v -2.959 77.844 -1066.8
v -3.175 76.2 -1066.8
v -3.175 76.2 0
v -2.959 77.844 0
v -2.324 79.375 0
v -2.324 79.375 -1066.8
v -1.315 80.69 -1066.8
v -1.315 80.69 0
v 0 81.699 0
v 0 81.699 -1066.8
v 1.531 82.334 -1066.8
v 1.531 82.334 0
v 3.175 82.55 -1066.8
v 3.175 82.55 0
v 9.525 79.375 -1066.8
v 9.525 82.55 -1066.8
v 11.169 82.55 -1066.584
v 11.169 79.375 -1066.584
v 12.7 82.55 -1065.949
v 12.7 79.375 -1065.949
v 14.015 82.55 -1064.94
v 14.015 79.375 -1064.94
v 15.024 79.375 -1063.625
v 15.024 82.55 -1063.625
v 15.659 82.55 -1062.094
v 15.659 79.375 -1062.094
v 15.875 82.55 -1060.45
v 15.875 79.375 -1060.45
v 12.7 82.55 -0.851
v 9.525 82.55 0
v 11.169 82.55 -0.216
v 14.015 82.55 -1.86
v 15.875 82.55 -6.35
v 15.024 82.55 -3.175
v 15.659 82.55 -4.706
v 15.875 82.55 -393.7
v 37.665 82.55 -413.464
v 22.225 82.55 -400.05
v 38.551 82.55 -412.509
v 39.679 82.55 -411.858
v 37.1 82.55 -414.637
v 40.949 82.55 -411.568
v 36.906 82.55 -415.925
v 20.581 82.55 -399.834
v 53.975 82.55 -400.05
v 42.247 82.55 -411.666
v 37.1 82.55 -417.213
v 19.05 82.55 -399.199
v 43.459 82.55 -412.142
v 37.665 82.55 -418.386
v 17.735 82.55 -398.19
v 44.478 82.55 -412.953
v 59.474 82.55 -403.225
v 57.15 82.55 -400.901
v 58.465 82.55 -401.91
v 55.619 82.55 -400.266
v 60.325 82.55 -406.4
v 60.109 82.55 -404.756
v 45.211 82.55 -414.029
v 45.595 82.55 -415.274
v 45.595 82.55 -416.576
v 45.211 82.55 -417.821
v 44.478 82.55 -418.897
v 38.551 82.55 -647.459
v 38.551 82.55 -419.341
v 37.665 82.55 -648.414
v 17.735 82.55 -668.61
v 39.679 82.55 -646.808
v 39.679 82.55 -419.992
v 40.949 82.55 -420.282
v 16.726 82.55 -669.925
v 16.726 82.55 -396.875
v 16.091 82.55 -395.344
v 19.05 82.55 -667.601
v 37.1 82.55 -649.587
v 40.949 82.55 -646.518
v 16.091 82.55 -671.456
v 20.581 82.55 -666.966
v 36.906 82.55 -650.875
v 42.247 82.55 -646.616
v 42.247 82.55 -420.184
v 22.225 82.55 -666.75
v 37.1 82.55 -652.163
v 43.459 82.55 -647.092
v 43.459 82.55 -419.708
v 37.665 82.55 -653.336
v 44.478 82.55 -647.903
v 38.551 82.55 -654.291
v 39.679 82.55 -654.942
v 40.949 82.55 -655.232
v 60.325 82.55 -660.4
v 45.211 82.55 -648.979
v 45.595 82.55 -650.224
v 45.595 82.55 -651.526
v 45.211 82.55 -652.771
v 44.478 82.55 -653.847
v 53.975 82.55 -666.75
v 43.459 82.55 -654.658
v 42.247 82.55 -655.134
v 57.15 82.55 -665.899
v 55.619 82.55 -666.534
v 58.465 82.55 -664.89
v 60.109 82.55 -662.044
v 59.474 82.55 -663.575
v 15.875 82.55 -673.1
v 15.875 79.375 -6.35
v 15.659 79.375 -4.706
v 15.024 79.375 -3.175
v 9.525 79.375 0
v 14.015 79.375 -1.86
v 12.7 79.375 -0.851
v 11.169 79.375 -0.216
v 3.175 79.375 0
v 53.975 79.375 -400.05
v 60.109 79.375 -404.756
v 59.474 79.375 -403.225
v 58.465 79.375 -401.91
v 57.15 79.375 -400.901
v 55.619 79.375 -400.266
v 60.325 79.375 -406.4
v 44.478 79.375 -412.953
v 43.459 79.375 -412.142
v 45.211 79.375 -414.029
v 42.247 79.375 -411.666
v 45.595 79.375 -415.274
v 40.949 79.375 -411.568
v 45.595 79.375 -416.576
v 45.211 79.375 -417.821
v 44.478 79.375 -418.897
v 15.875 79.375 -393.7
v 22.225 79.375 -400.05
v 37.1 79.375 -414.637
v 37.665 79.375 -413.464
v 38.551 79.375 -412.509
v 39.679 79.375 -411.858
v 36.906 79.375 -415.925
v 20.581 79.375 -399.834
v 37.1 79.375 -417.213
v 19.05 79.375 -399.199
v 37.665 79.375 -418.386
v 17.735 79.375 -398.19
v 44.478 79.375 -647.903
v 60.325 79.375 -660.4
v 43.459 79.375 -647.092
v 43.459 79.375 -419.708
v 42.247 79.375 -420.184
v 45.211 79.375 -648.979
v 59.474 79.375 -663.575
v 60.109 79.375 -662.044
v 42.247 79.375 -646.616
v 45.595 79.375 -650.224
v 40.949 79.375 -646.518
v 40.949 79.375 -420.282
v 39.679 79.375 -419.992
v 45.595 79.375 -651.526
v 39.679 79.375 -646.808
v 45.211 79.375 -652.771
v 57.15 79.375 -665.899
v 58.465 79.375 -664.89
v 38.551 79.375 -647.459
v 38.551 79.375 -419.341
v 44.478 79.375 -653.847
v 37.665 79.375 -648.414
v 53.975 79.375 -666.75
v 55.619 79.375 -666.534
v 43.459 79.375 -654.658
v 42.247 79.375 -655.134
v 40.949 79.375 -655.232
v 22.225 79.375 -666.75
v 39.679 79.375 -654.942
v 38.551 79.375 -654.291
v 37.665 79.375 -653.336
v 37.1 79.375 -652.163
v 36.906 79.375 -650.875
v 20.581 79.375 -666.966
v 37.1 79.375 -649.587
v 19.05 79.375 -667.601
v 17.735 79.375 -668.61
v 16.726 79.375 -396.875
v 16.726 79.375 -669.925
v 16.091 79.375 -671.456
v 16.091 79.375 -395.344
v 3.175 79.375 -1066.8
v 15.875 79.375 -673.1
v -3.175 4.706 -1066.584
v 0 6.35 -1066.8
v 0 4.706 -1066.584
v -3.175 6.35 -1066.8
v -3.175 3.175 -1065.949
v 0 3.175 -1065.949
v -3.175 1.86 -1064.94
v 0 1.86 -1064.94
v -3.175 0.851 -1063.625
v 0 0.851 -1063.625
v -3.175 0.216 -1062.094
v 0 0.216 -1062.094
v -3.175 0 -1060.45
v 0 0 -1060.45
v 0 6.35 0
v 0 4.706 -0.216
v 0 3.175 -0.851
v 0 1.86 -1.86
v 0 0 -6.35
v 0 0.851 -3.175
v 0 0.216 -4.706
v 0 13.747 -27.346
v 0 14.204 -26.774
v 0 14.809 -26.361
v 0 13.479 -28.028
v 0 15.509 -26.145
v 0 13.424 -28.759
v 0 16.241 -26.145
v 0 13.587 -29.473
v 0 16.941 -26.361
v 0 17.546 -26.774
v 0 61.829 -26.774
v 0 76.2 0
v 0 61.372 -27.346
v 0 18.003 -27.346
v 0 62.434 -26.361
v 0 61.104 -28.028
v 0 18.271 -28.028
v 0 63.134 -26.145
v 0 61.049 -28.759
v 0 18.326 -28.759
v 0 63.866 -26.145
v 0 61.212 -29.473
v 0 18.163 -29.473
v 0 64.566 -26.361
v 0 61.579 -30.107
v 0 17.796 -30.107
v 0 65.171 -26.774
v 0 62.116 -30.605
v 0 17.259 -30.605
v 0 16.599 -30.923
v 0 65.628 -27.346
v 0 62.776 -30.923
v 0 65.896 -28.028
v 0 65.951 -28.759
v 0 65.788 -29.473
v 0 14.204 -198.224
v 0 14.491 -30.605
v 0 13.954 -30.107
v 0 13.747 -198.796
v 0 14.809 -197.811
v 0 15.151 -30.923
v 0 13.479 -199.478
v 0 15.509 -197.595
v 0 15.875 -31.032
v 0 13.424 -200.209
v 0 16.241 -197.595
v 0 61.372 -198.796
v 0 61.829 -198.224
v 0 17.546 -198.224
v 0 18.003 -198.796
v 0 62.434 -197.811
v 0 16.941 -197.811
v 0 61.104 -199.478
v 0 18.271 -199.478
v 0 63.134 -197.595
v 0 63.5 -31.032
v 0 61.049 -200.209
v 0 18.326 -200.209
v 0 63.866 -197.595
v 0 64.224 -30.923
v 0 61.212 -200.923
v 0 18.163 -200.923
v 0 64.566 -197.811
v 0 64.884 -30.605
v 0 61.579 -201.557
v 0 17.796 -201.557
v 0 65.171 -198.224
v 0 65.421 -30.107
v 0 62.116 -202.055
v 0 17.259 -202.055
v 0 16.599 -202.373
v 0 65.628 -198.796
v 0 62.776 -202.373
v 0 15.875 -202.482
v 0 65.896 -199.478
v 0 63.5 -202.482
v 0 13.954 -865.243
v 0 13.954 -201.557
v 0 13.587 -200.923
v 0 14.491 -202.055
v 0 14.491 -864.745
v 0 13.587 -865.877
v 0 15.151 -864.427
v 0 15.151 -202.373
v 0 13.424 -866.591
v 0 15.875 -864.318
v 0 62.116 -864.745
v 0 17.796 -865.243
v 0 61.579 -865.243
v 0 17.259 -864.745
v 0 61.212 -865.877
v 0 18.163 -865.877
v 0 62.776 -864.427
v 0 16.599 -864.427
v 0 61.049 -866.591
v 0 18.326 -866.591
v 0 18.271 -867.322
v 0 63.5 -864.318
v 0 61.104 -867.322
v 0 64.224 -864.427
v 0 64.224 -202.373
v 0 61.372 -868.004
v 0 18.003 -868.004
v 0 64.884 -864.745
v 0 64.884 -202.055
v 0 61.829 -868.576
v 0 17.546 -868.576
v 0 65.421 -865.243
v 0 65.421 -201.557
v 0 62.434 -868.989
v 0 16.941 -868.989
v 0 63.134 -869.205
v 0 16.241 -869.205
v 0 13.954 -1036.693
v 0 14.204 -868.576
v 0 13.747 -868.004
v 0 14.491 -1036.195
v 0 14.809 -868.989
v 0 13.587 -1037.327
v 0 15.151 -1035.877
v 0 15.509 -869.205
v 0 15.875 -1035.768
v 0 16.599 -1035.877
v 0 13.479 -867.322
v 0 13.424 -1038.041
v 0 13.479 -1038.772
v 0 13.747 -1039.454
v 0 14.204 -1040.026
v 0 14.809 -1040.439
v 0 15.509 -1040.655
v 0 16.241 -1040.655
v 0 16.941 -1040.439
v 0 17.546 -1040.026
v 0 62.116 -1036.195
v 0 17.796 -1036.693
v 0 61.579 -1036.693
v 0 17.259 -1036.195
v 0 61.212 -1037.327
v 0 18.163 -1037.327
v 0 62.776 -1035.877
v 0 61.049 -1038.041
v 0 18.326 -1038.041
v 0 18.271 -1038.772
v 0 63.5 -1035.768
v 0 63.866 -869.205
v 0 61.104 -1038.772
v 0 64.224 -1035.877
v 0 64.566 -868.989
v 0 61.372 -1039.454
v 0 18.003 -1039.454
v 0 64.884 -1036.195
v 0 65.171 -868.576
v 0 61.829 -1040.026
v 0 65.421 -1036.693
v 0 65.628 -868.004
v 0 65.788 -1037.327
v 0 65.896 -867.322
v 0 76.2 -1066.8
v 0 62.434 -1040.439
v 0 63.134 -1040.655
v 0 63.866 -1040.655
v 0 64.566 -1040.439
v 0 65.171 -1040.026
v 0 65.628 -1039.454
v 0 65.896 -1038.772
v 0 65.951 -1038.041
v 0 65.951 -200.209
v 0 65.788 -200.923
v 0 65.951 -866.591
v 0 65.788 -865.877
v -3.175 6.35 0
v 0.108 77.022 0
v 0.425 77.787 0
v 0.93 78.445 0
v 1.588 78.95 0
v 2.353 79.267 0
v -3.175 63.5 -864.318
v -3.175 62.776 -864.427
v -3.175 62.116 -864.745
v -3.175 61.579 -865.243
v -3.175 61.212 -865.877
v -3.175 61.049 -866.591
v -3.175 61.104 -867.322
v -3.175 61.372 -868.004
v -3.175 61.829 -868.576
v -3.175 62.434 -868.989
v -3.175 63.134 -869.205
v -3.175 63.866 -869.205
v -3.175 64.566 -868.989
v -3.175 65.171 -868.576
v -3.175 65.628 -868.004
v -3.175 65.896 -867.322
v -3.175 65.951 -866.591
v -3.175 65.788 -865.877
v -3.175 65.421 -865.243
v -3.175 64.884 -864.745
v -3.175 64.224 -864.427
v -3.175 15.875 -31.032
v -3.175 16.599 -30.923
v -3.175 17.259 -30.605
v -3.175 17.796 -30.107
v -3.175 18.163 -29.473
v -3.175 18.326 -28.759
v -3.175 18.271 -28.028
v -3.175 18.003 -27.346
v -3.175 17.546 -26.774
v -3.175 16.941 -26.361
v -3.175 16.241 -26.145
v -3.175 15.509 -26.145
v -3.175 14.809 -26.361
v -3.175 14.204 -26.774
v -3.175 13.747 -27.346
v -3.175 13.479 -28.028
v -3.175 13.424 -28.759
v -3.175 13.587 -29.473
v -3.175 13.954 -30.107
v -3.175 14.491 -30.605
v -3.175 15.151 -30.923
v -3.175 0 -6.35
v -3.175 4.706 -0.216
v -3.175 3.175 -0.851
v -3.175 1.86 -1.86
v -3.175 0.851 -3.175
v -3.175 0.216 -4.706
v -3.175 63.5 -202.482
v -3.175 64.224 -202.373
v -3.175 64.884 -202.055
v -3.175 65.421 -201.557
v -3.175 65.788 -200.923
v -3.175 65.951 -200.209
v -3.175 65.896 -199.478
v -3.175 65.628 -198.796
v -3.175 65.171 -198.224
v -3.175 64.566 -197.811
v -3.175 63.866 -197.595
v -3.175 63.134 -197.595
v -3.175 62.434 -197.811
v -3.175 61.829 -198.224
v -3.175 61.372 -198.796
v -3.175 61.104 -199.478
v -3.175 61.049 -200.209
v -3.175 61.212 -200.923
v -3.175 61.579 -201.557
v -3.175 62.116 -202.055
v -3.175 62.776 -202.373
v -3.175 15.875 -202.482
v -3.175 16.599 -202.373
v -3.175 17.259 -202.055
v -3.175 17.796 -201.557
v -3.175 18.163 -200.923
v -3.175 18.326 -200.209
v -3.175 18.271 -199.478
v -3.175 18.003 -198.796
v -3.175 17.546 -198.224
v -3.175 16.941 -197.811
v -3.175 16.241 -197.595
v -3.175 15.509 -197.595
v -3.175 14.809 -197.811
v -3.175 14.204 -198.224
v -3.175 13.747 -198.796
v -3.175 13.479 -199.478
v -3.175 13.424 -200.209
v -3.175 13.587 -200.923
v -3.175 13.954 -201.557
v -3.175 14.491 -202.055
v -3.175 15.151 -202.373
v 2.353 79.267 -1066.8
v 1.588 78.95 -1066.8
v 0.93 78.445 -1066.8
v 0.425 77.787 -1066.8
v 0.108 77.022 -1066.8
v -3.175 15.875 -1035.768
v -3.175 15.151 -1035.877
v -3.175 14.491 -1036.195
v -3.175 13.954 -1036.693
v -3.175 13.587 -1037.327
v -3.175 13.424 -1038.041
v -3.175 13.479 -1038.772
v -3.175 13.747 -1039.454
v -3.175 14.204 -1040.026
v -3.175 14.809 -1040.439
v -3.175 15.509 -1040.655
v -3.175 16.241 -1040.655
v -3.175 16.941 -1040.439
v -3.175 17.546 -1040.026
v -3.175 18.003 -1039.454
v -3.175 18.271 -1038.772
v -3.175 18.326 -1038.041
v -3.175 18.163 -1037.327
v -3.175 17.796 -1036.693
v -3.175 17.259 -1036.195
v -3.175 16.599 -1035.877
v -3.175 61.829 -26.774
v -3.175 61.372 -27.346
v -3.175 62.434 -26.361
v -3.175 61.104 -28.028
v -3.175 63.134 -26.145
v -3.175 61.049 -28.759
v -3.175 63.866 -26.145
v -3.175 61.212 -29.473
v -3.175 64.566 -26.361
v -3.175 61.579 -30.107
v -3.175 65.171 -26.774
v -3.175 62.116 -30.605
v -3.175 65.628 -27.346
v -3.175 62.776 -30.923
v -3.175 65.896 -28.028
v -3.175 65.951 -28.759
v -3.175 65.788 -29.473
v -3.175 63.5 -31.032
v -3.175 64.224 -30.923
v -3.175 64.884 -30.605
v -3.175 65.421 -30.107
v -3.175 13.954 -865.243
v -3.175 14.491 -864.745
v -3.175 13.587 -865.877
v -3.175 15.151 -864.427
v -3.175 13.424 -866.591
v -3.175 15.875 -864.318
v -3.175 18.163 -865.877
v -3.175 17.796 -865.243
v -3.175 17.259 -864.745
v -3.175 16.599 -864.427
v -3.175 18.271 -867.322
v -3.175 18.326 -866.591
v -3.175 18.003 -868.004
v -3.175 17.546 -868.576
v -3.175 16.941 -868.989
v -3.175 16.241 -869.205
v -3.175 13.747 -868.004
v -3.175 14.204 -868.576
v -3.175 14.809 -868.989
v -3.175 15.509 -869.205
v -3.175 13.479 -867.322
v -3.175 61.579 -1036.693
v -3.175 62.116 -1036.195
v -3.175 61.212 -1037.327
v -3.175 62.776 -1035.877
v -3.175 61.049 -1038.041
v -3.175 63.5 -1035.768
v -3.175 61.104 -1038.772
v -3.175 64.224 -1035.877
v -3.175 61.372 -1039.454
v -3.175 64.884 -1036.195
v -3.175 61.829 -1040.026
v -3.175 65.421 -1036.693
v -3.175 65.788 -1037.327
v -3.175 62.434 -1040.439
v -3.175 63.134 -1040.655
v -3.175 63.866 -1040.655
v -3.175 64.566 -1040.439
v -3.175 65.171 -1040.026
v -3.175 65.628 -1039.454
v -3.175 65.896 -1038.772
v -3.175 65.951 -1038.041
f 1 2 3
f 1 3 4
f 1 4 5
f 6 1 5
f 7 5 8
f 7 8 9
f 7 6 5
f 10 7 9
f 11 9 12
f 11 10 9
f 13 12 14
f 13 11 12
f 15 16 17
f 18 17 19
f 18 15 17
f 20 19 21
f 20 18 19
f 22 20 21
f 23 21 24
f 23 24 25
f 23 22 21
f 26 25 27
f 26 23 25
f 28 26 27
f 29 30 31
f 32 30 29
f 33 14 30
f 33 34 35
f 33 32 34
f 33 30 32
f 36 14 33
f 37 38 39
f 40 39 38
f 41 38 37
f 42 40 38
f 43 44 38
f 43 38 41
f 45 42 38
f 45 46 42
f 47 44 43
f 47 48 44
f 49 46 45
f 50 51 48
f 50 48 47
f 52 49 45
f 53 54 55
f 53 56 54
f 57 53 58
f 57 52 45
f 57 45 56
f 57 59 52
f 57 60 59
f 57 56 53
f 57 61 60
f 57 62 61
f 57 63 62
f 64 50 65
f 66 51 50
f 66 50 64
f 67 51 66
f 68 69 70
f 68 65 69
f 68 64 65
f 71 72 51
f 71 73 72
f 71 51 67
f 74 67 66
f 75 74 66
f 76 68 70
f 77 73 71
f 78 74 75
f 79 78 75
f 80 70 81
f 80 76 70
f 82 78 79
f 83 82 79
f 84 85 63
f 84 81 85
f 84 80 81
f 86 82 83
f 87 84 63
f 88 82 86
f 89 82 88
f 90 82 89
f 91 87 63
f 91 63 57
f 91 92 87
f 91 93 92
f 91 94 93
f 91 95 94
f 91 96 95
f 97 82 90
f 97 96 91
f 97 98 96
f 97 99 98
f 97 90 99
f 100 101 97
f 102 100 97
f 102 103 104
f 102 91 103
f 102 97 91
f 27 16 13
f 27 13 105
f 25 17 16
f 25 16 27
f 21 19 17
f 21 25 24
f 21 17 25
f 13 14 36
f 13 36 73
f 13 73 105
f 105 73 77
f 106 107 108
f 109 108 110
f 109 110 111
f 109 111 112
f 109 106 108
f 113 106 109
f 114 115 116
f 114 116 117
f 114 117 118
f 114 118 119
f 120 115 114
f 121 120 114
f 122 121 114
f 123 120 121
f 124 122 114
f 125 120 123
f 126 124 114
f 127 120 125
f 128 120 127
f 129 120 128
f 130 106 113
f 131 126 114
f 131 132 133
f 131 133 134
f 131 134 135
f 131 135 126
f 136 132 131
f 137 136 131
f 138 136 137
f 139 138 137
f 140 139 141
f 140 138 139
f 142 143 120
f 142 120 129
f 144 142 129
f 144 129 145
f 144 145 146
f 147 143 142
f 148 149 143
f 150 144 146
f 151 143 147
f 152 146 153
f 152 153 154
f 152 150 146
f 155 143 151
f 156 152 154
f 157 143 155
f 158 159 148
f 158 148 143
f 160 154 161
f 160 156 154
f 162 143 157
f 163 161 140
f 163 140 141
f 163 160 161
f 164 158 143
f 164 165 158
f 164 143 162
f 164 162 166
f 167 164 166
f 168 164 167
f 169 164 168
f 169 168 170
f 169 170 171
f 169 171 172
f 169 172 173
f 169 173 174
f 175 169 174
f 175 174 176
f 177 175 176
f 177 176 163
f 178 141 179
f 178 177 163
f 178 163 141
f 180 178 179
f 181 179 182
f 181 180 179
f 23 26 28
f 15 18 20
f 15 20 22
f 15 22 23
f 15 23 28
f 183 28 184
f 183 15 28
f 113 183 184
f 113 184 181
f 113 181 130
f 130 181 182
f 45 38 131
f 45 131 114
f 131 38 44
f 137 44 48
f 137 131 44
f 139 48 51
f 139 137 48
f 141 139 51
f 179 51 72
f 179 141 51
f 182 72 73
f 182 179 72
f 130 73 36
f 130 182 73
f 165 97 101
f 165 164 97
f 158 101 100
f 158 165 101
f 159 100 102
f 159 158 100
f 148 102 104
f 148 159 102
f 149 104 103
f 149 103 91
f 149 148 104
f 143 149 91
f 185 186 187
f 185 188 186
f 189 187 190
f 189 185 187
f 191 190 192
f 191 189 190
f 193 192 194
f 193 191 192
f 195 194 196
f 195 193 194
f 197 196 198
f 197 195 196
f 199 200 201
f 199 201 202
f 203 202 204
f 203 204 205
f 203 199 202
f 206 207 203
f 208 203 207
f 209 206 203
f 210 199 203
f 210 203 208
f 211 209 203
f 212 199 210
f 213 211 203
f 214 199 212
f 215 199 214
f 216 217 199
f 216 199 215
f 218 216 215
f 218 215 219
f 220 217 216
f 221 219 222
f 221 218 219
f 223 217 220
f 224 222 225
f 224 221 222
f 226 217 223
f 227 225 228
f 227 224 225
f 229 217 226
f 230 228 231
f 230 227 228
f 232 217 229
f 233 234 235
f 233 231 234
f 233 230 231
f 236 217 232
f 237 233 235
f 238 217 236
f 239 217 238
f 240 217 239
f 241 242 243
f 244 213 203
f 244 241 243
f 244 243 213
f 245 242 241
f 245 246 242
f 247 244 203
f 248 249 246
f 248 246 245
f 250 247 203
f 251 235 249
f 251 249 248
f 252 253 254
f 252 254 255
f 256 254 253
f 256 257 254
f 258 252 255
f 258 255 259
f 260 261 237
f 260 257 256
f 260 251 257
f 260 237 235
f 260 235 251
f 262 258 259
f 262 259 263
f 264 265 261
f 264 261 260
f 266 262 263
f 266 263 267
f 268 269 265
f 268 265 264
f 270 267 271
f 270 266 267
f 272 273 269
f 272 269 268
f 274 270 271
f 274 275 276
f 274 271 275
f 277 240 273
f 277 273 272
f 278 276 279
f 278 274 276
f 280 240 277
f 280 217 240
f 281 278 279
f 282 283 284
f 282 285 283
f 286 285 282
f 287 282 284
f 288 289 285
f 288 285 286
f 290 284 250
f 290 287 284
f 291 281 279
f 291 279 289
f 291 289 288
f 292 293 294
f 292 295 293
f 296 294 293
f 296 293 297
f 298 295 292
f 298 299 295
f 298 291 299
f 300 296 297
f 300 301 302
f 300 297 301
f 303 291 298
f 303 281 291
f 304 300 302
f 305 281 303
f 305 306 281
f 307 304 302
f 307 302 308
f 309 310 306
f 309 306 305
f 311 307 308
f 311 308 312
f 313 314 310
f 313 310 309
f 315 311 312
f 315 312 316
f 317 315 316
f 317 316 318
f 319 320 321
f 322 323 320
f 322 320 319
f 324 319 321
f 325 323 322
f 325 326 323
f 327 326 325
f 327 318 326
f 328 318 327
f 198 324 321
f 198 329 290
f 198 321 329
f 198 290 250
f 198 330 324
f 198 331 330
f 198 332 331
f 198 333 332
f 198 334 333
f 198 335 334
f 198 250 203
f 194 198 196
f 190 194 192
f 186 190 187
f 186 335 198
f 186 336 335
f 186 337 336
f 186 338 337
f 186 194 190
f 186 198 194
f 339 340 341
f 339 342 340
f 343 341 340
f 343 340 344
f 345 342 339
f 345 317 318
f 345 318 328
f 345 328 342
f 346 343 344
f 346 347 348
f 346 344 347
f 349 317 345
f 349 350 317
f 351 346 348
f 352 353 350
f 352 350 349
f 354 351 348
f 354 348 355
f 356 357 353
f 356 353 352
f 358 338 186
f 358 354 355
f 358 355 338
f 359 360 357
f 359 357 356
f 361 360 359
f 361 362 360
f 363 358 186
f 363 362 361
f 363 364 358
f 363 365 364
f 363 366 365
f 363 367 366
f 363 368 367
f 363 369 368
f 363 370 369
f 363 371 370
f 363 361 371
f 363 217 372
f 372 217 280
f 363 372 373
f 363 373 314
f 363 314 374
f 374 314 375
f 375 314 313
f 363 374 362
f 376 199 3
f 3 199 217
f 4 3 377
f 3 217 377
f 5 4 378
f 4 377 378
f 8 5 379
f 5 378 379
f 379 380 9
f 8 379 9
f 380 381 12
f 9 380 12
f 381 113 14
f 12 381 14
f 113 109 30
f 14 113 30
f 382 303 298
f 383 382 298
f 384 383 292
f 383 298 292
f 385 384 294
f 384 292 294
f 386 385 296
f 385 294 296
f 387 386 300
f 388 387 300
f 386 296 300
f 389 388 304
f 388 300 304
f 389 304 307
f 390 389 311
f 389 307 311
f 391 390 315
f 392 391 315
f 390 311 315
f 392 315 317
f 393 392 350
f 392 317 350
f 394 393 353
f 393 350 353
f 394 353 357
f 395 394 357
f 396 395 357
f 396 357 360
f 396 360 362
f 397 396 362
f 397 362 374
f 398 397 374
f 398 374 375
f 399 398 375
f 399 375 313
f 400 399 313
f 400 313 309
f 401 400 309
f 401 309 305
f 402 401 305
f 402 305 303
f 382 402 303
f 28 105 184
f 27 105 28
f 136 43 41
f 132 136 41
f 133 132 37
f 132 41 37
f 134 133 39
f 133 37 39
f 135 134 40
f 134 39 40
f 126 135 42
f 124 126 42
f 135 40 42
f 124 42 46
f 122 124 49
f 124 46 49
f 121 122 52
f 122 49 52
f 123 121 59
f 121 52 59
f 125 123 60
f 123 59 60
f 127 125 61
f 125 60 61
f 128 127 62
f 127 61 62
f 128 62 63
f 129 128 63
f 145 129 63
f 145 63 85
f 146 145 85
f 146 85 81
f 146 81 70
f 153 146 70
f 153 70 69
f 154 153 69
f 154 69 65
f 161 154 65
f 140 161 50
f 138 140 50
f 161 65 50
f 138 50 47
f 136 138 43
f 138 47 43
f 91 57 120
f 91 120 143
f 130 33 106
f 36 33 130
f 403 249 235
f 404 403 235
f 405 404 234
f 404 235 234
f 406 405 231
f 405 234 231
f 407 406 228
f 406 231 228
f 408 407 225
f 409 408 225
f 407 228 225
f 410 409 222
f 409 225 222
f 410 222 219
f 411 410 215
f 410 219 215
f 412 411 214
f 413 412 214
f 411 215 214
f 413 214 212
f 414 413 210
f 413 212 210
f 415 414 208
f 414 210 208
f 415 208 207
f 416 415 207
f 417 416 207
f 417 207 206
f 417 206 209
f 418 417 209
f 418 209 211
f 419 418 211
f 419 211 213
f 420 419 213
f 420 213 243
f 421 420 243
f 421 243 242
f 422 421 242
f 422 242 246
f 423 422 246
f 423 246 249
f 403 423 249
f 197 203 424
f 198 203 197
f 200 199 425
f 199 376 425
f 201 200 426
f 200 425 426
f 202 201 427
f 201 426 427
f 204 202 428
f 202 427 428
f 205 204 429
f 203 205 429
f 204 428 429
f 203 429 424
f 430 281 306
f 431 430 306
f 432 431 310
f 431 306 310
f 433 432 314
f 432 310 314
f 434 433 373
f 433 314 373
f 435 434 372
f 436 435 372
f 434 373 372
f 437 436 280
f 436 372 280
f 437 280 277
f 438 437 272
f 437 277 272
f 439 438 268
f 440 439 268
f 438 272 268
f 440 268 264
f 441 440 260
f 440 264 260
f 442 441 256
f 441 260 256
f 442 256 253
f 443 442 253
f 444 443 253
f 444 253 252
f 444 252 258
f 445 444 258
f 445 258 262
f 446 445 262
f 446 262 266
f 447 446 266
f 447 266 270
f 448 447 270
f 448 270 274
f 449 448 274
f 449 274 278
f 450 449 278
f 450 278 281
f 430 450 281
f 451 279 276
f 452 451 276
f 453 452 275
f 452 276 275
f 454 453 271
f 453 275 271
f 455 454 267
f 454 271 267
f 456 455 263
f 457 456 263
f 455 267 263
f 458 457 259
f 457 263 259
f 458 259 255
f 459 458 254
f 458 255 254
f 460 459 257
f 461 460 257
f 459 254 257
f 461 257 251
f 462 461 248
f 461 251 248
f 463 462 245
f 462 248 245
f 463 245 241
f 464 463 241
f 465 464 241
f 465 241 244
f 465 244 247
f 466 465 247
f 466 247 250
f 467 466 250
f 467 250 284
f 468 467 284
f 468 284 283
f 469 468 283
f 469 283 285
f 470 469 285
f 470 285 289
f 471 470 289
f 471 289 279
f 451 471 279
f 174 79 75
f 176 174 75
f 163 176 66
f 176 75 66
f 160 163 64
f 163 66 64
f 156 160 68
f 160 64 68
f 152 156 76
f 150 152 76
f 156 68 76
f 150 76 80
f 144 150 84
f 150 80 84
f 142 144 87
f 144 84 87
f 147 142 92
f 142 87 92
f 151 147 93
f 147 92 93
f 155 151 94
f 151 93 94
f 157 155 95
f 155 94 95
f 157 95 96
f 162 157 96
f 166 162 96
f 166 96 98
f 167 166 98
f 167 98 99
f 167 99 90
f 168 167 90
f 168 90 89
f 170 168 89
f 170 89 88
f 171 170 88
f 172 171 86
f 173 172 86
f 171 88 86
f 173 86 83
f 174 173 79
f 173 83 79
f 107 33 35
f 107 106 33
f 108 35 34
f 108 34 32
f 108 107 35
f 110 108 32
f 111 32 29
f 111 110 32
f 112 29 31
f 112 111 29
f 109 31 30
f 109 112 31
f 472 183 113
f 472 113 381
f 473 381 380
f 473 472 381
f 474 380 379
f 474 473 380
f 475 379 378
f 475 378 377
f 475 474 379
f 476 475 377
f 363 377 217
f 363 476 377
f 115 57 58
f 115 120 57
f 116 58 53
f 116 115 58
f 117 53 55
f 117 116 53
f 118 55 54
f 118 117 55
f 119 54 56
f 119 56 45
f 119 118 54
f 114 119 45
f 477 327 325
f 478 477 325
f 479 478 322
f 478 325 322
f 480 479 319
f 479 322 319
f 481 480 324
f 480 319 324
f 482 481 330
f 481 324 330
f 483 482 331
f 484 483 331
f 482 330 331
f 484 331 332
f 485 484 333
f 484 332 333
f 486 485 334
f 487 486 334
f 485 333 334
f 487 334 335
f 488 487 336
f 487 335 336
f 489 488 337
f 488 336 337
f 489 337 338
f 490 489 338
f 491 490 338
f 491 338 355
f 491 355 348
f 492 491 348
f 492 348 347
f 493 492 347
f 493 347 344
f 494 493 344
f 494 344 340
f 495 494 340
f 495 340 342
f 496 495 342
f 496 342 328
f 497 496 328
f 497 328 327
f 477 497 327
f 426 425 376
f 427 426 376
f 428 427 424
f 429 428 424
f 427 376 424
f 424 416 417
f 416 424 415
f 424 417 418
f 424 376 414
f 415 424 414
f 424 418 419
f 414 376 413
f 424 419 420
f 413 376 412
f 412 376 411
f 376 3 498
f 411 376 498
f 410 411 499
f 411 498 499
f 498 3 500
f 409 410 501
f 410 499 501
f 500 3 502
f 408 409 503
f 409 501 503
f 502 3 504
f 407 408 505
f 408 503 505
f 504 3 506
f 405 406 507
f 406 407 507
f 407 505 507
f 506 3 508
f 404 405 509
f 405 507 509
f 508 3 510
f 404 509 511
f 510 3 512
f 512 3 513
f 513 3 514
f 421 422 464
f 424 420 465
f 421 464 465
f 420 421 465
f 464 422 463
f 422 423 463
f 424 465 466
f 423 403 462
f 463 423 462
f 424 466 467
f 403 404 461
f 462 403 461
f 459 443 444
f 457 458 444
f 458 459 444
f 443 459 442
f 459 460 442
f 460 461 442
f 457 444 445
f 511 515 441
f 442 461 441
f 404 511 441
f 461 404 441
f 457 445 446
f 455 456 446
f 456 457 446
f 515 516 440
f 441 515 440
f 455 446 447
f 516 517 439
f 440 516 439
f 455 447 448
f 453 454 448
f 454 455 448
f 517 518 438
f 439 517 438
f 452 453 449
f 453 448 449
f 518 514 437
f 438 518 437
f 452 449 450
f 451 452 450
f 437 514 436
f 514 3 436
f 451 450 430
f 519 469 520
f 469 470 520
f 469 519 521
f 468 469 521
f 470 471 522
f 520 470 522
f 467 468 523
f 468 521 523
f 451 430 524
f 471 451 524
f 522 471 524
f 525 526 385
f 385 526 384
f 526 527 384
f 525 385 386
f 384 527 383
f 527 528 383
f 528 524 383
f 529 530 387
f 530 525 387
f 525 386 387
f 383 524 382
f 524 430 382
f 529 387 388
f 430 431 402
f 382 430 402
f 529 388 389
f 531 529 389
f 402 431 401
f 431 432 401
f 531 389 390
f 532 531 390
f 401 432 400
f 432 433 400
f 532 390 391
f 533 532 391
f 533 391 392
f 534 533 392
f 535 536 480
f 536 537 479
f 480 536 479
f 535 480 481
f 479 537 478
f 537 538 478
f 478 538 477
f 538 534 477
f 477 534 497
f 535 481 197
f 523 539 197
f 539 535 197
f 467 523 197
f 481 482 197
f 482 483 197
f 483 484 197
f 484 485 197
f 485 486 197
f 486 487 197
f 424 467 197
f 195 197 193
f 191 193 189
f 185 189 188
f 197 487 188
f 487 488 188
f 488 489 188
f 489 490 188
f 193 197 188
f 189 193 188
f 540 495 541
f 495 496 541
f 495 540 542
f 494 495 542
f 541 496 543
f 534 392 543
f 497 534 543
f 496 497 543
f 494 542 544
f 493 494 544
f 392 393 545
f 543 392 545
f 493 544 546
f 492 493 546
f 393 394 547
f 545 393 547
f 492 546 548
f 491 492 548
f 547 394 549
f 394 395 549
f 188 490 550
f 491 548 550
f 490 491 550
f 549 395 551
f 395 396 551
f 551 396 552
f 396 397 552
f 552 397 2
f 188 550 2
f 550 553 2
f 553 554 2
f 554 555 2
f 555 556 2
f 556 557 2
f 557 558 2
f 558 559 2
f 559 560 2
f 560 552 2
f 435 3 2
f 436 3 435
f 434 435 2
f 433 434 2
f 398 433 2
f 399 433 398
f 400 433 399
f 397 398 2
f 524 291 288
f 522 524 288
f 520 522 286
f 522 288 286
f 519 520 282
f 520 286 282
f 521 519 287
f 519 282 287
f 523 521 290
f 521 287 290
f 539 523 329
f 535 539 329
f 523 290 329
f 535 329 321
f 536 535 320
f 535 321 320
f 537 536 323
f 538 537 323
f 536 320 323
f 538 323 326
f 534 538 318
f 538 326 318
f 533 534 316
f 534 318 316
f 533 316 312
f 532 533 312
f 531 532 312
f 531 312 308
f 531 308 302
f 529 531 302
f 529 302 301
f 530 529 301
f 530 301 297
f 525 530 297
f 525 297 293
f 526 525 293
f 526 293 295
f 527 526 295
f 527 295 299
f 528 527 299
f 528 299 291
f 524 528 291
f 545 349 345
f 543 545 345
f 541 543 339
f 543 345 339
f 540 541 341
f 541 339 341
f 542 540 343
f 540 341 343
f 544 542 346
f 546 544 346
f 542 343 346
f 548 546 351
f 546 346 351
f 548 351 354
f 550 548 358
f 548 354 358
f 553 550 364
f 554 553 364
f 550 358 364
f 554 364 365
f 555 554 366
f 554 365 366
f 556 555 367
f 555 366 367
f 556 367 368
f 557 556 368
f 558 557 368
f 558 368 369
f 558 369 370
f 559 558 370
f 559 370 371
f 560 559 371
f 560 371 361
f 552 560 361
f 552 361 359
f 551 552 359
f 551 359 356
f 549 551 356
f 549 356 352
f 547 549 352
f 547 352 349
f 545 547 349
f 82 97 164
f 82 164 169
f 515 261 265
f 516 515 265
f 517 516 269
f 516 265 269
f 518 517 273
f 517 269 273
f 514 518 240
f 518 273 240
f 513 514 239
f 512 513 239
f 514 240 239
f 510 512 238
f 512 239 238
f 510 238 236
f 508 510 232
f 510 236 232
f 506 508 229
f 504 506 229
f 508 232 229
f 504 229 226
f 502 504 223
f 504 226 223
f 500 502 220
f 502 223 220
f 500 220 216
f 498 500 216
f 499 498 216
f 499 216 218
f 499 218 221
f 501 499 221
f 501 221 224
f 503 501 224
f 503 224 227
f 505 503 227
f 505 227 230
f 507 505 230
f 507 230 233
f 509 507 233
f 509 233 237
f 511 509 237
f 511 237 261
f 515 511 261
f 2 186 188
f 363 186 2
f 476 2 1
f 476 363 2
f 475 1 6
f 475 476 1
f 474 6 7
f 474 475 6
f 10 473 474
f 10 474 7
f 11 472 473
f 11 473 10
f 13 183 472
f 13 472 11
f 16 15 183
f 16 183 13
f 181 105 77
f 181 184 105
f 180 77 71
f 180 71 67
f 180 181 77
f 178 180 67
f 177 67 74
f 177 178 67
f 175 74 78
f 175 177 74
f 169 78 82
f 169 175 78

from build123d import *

# Parameters (mm, degrees)
SKETCH1_W                    = 1066.8
SKETCH1_H                    = 82.55
BASE_FLANGE1_DEPTH           = 3.175
EDGE_FLANGE1_STRIP_W         = 19.05
EDGE_FLANGE1_STRIP_H         = 3.175
EDGE_FLANGE1_STRIP_CUT_DEPTH = 1066.8
EDGE_FLANGE1_DEPTH           = 1066.8
SKETCH9_R                    = 2.45745
CUT_EXTRUDE1_DEPTH           = 1072.688316688
SKETCH10_R                   = 4.3688
CUT_EXTRUDE2_DEPTH           = 3.175
FILLET1_R                    = 6.35


# Sheet-metal steps are written as plain solids
with BuildPart() as part:
    # Sketch1 → Base-Flange1 (new body)
    with BuildSketch(Plane(origin=(0, 0, 0), x_dir=(0, 0, -1), z_dir=(1, 0, 0))):
        with Locations((533.4, 41.275)):
            Rectangle(SKETCH1_W, SKETCH1_H)
    extrude(amount=-BASE_FLANGE1_DEPTH)

    # Edge-Flange1 strip (across the edge) → Edge-Flange1 strip cut (cut)
    with BuildSketch(Plane(origin=(0, 82.55, -1066.8), x_dir=(0, -1, 0), z_dir=(0, 0, 1))):
        with Locations((-3.175, -1.5875)):
            Rectangle(EDGE_FLANGE1_STRIP_W, EDGE_FLANGE1_STRIP_H)
    extrude(amount=EDGE_FLANGE1_STRIP_CUT_DEPTH, mode=Mode.SUBTRACT)

    # Edge-Flange1 section (across the edge) → Edge-Flange1 (add)
    with BuildSketch(Plane(origin=(0, 82.55, -1066.8), x_dir=(0, -1, 0), z_dir=(0, 0, 1))):
        with BuildLine():
            Line((0, 3.175), (0, 60.325))
            Line((0, 60.325), (3.175, 60.325))
            Line((3.175, 60.325), (3.175, 3.175))
            ThreePointArc((3.175, 3.175), (4.10493597, 0.92993597), (6.35, 0))
            Line((6.35, 0), (6.35, -3.175))
            ThreePointArc((6.35, -3.175), (1.859871939, -1.315128061), (0, 3.175))
        make_face()
    extrude(amount=EDGE_FLANGE1_DEPTH)

    # Sketch9 → Cut-Extrude1 (cut, through all)
    with BuildSketch(Plane(origin=(0, 0, 0), x_dir=(0, 0, -1), z_dir=(1, 0, 0))):
        with Locations((28.575, 63.5)):
            Circle(SKETCH9_R)
        with Locations((200.025, 63.5)):
            Circle(SKETCH9_R)
        with Locations((28.575, 15.875)):
            Circle(SKETCH9_R)
        with Locations((200.025, 15.875)):
            Circle(SKETCH9_R)
        with Locations(Location((866.775, 63.5, 0), (0, 0, 180))):
            Circle(SKETCH9_R)
        with Locations(Location((866.775, 15.875, 0), (0, 0, 180))):
            Circle(SKETCH9_R)
        with Locations(Location((1038.225, 15.875, 0), (0, 0, 180))):
            Circle(SKETCH9_R)
        with Locations(Location((1038.225, 63.5, 0), (0, 0, 180))):
            Circle(SKETCH9_R)
    extrude(amount=-CUT_EXTRUDE1_DEPTH, mode=Mode.SUBTRACT)

    # Sketch10 → Cut-Extrude2 (cut)
    with BuildSketch(Plane(origin=(0, 82.55, 0), x_dir=(1, 0, 0), z_dir=(0, 1, 0))):
        with Locations(Location((41.275, 650.875, 0), (0, 0, 180))):
            Circle(SKETCH10_R)
        with Locations(Location((41.275, 415.925, 0), (0, 0, 180))):
            Circle(SKETCH10_R)
        Polygon((15.875, 1066.8), (79.375, 1066.8), (79.375, 0), (15.875, 0), (15.875, 400.05), (60.325, 400.05), (60.325, 666.75), (15.875, 666.75), align=None)
    extrude(amount=-CUT_EXTRUDE2_DEPTH, mode=Mode.SUBTRACT)

    # Fillet1
    fillet1_edges = [part.edges().sort_by_distance(p)[0] for p in [
        (15.875, 80.9625, -1066.8),
        (15.875, 80.9625, -666.75),
        (15.875, 80.9625, 0),
        (15.875, 80.9625, -400.05),
        (60.325, 80.9625, -400.05),
        (60.325, 80.9625, -666.75),
        (-1.5875, 0, 0),
        (-1.5875, 0, -1066.8),
    ]]
    fillet(fillet1_edges, radius=FILLET1_R)


solid = part.part
